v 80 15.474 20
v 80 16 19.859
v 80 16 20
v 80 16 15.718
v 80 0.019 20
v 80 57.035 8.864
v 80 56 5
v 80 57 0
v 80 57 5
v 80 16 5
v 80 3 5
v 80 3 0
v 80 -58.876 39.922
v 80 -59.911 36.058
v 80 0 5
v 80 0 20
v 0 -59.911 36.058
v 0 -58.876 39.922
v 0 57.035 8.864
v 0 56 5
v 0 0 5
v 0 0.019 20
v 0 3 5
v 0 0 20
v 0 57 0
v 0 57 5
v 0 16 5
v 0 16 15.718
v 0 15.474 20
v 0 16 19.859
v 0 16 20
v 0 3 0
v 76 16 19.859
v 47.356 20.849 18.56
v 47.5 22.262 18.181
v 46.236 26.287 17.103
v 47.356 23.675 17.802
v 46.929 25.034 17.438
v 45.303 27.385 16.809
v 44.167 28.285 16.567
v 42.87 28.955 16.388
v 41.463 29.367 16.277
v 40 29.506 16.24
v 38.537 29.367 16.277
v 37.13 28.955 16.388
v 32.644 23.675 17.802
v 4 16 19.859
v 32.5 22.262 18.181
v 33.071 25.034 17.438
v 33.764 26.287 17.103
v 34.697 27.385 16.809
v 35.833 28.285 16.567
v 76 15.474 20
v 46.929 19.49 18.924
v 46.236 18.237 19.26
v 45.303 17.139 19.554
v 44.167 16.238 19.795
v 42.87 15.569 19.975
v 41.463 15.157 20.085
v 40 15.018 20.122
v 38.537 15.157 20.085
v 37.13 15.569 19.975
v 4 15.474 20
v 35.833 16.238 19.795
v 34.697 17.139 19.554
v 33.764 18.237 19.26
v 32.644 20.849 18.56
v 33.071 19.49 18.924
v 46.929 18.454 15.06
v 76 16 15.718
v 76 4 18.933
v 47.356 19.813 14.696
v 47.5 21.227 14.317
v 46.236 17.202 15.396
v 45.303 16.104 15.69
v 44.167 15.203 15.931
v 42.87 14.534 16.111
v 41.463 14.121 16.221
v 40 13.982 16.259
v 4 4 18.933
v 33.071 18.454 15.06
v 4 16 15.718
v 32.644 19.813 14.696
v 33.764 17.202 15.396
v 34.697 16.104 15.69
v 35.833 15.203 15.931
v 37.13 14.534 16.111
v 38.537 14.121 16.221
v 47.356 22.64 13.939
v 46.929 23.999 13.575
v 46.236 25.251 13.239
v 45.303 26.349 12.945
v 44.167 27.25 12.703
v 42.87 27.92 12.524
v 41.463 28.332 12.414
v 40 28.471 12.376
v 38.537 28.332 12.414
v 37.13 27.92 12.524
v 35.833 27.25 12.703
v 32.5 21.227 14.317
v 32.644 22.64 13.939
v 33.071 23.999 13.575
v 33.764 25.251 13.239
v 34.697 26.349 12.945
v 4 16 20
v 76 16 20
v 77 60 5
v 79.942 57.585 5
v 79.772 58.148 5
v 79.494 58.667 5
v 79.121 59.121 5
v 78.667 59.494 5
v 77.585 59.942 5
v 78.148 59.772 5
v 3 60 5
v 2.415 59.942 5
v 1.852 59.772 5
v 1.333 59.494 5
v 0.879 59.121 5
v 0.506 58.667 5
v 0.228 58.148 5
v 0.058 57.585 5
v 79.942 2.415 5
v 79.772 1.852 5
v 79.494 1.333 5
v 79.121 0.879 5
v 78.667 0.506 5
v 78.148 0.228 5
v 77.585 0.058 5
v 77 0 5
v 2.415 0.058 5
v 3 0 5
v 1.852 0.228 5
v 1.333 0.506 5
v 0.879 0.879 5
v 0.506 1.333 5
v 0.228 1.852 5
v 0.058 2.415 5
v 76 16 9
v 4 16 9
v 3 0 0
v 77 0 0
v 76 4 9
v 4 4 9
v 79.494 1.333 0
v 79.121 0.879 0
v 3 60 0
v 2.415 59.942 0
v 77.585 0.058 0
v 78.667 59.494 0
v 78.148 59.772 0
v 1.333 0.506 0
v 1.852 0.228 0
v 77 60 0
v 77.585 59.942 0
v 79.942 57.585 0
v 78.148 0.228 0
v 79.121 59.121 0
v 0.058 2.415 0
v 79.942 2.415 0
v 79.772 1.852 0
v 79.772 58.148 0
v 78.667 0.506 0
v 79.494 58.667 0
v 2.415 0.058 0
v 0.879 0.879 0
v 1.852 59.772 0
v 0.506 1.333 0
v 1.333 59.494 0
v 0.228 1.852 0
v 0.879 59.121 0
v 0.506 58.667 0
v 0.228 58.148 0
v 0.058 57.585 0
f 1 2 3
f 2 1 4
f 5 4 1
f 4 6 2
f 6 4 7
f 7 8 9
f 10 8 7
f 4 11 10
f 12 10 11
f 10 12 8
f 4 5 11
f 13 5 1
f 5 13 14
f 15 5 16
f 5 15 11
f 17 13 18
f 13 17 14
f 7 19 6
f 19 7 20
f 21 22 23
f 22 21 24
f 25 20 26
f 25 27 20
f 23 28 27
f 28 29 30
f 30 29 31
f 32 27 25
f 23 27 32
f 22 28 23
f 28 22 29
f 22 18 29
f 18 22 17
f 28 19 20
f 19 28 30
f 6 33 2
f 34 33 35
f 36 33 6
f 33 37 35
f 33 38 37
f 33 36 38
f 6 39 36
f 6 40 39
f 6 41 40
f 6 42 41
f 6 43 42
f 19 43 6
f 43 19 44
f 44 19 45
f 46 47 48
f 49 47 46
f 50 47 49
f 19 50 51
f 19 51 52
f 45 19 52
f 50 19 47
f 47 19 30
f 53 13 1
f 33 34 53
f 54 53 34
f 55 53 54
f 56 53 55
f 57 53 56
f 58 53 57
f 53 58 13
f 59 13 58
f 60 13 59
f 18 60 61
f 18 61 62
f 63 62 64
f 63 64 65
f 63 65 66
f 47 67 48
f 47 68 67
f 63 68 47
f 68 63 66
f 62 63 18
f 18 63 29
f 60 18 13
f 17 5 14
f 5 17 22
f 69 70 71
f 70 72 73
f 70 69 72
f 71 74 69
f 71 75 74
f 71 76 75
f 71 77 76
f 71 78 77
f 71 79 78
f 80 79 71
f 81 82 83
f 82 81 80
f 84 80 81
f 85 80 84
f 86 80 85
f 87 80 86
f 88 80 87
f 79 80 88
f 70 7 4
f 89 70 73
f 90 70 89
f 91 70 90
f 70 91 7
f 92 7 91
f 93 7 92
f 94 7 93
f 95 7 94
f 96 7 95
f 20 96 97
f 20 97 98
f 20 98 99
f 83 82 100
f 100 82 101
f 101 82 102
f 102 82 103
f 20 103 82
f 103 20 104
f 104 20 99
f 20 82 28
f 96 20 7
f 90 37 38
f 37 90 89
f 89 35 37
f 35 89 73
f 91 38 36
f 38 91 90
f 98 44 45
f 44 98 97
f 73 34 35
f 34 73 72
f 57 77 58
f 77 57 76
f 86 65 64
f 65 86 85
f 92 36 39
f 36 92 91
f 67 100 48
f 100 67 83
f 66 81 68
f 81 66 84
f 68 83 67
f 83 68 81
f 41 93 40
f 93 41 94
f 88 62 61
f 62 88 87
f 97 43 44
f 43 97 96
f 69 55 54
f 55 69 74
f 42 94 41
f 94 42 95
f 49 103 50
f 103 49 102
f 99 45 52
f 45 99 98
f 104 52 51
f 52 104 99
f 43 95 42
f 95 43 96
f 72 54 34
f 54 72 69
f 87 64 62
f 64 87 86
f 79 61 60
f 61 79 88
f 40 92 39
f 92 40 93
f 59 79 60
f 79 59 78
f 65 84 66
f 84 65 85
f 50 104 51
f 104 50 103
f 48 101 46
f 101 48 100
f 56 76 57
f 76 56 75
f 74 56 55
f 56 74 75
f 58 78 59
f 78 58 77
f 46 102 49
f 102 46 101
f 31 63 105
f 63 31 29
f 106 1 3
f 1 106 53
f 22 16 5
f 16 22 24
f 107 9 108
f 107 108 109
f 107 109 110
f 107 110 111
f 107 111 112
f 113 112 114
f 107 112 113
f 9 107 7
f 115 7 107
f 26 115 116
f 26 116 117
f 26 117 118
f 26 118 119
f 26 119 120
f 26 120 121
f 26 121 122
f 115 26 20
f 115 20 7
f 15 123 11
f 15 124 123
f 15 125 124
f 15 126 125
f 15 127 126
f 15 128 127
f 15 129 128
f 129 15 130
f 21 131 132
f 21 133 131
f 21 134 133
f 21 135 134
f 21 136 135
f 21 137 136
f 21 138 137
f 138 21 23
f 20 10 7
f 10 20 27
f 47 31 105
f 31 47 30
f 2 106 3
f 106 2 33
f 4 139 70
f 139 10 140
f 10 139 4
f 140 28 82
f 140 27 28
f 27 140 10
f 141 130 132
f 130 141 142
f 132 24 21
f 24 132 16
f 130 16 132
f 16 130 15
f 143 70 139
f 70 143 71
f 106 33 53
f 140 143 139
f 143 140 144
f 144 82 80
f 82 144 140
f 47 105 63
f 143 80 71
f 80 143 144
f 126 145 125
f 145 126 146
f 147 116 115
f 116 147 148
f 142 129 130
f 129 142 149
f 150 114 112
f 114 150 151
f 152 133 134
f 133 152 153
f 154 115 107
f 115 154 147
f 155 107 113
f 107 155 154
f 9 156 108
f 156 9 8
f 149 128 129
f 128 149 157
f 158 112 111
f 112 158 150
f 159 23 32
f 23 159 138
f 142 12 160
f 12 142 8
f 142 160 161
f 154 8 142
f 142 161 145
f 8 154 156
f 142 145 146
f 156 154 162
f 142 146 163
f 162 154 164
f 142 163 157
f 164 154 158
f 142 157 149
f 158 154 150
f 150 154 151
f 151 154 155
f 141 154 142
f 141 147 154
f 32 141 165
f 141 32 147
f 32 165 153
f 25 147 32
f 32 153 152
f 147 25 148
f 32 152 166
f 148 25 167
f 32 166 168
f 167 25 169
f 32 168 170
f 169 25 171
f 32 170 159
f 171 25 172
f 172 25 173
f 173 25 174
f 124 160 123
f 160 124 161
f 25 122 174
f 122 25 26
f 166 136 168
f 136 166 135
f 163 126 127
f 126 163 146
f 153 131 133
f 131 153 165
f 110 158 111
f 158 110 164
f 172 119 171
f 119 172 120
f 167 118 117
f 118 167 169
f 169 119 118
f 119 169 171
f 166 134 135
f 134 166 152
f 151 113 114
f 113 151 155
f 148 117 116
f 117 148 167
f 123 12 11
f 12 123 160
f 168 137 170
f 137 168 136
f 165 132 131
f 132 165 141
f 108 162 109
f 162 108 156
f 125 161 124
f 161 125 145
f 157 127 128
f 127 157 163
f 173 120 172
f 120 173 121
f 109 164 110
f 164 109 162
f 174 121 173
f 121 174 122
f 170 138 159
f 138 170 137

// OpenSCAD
// Parametric Phone Stand
// A customizable stand for phones and tablets
// License: CC0 (Public Domain)

/* [Dimensions] */
// Width of the stand (should fit your phone)
width = 80; // [50:200]

// Depth of the base
base_depth = 60; // [30:100]

// Height of the back support
back_height = 120; // [60:200]

// Phone/tablet thickness (add 1-2mm margin)
device_thickness = 12; // [5:25]

/* [Angle] */
// Viewing angle (degrees from vertical)
tilt_angle = 15; // [0:45]

/* [Style] */
// Stand style
style = "solid"; // [solid, openwork, minimal]

// Edge rounding
corner_radius = 3; // [0:10]

/* [Charging] */
// Add cable hole for charging
cable_hole = "yes"; // [yes, no]

// Cable hole diameter
cable_diameter = 15; // [8:25]

/* [Quality] */
// Render quality
$fn = 32; // [16:64]

/* [Hidden] */
back_angle = 90 - tilt_angle;
base_thickness = 5;
wall_thickness = 4;
lip_height = 15;

module phone_stand() {
    union() {
        // Base plate
        base_plate();
        
        // Back support
        back_support();
        
        // Front lip to hold phone
        front_lip();
    }
}

module base_plate() {
    if (style == "openwork") {
        difference() {
            rounded_cube(width, base_depth, base_thickness, corner_radius);
            // Cut out center
            translate([wall_thickness*2, wall_thickness*2, -0.1])
                rounded_cube(width - wall_thickness*4, base_depth - wall_thickness*4, base_thickness + 0.2, corner_radius);
        }
    } else if (style == "minimal") {
        // Just front and back rails
        rounded_cube(width, wall_thickness*2, base_thickness, corner_radius);
        translate([0, base_depth - wall_thickness*2, 0])
            rounded_cube(width, wall_thickness*2, base_thickness, corner_radius);
    } else {
        rounded_cube(width, base_depth, base_thickness, corner_radius);
    }
    
}

module back_support() {
    translate([0, base_depth - wall_thickness, base_thickness]) {
        rotate([back_angle, 0, 0]) {
            difference() {
                union() {
                    // Main back
                    if (style == "openwork") {
                        // Frame only
                        cube([wall_thickness, wall_thickness, back_height]);
                        translate([width - wall_thickness, 0, 0])
                            cube([wall_thickness, wall_thickness, back_height]);
                        translate([0, 0, back_height - wall_thickness])
                            cube([width, wall_thickness, wall_thickness]);
                    } else if (style == "minimal") {
                        // Two posts
                        cube([wall_thickness*2, wall_thickness, back_height]);
                        translate([width - wall_thickness*2, 0, 0])
                            cube([wall_thickness*2, wall_thickness, back_height]);
                    } else {
                        cube([width, wall_thickness, back_height]);
                    }
                }
                
                // Cable hole
                if (cable_hole == "yes" && style == "solid") {
                    translate([width/2, -0.1, back_height * 0.3])
                        rotate([-90, 0, 0])
                        cylinder(d=cable_diameter, h=wall_thickness + 0.2);
                }
            }
        }
    }
}

module front_lip() {
    translate([0, 0, base_thickness]) {
        difference() {
            // Outer lip
            cube([width, device_thickness + wall_thickness, lip_height]);
            
            // Inner cutout for device
            translate([wall_thickness, wall_thickness, wall_thickness])
                cube([width - wall_thickness*2, device_thickness, lip_height]);
        }
    }
}

module rounded_cube(w, d, h, r) {
    if (r <= 0) {
        cube([w, d, h]);
    } else {
        hull() {
            translate([r, r, 0]) cylinder(r=r, h=h);
            translate([w-r, r, 0]) cylinder(r=r, h=h);
            translate([r, d-r, 0]) cylinder(r=r, h=h);
            translate([w-r, d-r, 0]) cylinder(r=r, h=h);
        }
    }
}

// Render
phone_stand();
